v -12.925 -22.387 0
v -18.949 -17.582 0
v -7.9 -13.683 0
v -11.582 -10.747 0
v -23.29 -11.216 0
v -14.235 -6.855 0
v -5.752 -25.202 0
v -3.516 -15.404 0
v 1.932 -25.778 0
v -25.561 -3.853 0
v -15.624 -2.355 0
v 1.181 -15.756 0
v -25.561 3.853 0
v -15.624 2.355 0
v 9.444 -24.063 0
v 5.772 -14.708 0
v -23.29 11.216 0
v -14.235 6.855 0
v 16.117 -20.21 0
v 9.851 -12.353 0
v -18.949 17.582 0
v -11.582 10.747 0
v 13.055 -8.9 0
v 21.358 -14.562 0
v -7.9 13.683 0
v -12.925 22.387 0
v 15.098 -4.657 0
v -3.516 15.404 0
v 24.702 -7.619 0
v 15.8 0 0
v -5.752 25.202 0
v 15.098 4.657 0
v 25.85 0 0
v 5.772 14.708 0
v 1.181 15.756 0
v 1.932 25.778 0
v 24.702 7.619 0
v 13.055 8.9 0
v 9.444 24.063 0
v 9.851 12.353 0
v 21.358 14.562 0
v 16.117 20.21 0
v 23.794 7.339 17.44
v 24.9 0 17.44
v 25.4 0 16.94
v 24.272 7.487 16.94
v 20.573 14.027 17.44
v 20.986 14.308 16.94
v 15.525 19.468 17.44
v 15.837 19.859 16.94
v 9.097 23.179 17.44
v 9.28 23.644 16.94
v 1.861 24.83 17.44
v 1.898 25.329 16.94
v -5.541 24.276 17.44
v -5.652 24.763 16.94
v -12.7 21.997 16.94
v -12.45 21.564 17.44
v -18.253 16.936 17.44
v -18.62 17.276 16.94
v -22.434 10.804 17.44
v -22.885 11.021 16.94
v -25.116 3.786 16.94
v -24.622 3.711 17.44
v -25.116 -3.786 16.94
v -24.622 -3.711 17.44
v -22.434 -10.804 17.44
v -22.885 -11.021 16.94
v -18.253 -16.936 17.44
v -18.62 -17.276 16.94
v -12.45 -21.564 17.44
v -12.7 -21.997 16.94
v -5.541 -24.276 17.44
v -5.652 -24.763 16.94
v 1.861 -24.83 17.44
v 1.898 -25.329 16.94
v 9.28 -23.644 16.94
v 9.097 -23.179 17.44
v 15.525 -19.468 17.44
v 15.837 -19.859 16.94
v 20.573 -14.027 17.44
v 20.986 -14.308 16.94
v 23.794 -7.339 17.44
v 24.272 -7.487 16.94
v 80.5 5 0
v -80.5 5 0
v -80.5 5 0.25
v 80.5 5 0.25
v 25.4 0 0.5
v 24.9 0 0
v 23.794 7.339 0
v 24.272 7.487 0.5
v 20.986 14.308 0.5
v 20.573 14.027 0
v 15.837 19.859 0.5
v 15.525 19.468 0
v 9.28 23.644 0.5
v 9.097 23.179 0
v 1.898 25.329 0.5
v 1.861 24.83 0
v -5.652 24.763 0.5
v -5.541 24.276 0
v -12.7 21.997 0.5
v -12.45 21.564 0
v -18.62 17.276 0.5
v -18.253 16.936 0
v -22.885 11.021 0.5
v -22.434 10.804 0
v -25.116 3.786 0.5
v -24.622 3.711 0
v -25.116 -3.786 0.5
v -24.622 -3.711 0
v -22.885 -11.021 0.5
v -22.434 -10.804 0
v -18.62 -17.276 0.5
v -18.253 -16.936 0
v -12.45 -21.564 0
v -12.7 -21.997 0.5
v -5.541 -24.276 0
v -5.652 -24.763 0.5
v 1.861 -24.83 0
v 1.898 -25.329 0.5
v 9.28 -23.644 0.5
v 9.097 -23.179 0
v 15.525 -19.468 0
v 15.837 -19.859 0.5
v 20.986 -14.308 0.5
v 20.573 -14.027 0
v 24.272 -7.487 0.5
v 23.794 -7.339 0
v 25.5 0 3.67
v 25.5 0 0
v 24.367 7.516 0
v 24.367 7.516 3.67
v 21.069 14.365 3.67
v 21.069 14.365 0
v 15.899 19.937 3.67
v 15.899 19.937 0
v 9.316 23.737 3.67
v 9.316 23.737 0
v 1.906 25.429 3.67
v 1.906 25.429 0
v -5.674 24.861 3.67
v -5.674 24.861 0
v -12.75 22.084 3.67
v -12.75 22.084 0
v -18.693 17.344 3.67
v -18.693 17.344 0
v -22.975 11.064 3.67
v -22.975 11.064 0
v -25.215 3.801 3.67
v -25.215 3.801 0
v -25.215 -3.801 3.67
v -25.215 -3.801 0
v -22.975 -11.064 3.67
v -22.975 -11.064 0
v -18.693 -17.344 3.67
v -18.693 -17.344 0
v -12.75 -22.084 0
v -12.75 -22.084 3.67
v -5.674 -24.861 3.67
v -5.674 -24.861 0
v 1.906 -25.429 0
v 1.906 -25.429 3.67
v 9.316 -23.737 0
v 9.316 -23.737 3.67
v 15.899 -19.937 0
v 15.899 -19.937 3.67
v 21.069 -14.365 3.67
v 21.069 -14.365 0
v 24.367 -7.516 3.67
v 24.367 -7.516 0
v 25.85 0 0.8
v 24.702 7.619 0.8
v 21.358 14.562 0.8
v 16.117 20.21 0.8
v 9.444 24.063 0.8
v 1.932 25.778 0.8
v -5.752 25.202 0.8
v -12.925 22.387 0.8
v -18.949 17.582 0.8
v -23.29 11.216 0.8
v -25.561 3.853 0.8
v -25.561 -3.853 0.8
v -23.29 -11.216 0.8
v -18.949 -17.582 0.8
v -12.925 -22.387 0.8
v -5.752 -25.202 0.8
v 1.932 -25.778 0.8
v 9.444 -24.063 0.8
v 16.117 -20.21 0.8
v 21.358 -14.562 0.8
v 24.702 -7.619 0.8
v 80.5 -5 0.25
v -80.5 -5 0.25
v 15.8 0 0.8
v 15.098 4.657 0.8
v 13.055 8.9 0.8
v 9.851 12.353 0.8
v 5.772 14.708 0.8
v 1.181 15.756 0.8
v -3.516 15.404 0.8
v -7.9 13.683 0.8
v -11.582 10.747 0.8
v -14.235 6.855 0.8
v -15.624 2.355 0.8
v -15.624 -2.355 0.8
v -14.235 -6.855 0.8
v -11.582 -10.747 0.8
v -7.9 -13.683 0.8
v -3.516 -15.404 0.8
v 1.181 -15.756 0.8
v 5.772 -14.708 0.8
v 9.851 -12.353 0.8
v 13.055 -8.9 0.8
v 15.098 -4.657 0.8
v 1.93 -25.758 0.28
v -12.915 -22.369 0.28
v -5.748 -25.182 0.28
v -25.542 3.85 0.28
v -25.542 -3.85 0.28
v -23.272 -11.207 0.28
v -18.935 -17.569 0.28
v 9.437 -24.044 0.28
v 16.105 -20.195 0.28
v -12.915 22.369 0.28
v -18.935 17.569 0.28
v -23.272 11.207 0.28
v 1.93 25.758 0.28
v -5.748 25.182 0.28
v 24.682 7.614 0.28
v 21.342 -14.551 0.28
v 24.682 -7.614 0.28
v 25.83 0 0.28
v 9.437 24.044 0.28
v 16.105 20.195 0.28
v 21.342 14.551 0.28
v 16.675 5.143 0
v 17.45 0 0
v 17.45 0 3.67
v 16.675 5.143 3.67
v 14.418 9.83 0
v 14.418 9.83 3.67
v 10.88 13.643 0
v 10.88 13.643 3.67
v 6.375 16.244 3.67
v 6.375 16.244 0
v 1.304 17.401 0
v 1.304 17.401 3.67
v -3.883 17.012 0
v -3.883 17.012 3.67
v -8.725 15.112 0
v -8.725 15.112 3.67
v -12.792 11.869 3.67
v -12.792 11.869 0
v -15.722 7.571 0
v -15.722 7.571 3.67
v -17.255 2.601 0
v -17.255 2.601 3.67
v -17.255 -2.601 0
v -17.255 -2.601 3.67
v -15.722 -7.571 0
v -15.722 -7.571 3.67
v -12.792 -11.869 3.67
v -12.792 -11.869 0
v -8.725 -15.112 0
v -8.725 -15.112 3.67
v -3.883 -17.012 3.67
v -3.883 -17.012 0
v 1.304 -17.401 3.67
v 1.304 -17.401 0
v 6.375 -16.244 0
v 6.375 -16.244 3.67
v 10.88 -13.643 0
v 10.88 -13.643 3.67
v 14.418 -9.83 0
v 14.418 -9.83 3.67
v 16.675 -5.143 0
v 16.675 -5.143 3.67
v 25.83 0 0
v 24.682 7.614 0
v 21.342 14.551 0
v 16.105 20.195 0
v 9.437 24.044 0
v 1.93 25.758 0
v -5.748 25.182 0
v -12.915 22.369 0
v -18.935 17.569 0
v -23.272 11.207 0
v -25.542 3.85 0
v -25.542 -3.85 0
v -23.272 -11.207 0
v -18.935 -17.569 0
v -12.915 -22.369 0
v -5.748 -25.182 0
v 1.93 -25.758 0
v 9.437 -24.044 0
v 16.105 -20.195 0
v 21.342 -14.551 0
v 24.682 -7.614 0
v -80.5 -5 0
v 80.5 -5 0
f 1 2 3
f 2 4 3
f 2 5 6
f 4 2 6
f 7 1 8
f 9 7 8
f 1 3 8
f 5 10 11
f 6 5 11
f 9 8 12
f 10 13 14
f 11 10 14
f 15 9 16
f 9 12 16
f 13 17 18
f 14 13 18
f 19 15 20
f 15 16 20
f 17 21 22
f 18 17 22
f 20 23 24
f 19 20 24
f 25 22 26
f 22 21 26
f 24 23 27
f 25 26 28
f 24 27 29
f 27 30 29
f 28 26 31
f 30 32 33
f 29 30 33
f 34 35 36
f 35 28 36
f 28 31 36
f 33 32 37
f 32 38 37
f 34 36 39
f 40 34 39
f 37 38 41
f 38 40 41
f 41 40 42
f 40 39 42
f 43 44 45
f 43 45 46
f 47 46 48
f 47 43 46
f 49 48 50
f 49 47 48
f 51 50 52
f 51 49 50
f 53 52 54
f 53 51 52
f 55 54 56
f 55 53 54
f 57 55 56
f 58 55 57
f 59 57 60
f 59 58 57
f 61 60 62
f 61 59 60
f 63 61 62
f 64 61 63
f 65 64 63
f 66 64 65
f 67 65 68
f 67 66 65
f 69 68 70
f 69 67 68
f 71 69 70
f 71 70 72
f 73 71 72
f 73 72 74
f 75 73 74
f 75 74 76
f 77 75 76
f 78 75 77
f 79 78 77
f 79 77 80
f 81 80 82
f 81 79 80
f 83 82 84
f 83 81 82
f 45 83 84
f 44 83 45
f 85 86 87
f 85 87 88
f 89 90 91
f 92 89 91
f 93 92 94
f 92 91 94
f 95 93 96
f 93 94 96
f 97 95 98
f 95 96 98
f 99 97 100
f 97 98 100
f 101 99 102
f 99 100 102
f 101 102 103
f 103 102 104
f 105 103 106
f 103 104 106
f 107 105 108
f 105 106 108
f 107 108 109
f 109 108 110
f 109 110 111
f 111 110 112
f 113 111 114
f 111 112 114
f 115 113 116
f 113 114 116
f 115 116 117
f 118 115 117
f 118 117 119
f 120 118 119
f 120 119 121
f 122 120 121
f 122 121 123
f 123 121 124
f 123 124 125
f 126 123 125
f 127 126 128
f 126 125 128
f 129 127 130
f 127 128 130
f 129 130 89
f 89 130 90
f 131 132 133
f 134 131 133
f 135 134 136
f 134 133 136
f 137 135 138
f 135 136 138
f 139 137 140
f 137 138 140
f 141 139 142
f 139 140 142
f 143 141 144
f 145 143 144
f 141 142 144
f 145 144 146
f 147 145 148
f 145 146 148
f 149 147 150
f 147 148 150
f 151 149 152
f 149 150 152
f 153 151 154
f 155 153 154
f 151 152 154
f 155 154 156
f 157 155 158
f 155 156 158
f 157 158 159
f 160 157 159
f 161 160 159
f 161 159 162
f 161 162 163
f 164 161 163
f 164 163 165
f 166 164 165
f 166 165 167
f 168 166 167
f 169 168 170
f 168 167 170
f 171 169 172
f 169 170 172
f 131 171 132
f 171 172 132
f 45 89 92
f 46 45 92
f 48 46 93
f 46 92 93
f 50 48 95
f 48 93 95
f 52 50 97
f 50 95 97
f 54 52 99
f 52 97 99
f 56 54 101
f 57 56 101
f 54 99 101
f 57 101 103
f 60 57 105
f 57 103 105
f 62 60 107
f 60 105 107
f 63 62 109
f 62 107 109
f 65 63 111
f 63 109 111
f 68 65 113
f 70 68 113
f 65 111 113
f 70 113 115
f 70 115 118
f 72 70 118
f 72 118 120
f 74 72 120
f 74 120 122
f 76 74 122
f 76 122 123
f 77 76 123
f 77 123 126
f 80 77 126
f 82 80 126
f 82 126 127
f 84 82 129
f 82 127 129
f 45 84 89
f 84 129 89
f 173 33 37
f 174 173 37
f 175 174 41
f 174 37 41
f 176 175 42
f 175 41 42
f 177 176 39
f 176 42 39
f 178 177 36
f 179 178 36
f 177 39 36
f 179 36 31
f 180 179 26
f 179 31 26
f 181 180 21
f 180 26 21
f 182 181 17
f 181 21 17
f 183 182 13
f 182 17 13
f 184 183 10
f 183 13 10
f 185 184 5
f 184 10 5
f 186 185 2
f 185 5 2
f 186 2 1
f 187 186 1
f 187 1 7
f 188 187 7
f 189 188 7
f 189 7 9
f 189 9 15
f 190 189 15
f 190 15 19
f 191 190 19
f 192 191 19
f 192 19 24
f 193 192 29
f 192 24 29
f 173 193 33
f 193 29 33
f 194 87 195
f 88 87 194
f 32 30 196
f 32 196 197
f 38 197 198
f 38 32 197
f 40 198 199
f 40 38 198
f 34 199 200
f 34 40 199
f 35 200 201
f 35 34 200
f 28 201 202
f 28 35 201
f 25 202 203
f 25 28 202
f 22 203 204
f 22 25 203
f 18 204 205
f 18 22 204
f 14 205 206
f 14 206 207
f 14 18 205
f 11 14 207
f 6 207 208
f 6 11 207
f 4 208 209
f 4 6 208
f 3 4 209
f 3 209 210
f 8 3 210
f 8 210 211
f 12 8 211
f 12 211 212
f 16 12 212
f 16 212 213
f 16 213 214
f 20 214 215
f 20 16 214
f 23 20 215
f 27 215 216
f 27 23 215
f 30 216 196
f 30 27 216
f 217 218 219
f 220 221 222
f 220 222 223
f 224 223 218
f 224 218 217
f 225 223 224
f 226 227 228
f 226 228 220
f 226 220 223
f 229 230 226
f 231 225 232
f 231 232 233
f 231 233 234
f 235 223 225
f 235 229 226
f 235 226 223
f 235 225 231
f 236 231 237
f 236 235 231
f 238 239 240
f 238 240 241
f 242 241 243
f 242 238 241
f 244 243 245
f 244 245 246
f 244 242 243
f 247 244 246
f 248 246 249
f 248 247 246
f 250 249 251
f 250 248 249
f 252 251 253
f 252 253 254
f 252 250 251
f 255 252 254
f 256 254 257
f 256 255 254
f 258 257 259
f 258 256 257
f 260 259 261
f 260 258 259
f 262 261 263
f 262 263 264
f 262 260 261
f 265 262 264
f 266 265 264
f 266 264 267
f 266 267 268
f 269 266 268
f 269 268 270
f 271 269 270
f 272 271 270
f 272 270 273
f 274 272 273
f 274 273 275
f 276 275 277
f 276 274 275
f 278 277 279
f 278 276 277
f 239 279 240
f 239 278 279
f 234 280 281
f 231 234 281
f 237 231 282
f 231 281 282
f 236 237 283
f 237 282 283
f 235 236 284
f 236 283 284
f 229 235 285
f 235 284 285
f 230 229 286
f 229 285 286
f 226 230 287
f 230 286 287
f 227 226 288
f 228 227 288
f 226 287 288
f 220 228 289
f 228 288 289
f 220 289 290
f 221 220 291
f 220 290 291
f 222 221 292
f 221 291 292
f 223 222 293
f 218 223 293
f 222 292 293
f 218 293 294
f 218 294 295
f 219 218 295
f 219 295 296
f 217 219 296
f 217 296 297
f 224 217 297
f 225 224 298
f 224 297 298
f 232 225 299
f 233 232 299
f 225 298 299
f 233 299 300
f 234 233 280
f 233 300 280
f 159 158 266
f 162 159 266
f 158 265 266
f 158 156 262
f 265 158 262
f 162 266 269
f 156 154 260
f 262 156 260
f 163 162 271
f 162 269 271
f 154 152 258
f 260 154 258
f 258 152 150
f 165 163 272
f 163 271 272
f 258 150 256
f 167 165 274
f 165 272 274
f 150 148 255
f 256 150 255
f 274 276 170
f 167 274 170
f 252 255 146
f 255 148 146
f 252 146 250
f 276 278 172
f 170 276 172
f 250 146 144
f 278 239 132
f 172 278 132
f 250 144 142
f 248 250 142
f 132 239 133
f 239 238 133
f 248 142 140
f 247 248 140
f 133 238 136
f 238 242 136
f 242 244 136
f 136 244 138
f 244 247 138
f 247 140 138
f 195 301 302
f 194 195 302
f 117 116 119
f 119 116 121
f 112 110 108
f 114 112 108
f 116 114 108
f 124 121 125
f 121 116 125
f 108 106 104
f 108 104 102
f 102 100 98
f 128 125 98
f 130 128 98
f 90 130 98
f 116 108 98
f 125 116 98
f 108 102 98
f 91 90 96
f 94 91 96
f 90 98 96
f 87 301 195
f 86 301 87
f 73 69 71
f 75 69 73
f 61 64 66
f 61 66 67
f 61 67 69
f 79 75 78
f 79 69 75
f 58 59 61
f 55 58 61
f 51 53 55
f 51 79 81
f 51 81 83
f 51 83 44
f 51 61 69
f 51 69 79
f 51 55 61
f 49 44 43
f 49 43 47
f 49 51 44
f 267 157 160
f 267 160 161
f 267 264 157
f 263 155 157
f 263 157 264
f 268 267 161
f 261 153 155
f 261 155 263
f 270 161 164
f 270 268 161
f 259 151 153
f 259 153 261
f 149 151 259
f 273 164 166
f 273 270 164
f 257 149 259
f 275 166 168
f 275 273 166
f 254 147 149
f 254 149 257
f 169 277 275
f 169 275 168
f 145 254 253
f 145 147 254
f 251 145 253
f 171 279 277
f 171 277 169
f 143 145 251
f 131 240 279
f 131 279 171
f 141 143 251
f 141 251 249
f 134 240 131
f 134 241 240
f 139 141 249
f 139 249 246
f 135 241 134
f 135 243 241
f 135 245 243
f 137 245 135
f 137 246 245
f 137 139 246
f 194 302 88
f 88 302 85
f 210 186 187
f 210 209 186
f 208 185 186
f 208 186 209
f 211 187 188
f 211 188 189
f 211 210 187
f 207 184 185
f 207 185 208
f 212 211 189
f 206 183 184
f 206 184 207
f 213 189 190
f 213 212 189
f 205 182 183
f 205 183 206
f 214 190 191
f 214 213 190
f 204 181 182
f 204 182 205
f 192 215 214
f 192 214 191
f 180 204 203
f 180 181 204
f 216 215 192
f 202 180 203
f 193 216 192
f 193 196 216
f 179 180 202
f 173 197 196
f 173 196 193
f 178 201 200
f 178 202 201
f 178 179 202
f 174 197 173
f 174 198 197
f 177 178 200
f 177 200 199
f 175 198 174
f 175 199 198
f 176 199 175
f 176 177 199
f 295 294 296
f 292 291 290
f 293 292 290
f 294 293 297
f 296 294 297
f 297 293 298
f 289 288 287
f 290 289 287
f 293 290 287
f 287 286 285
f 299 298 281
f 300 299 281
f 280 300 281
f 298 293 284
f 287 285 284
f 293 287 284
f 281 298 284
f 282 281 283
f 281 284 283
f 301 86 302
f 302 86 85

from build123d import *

# Parameters (mm, degrees)
F0_R      = 25.4
F1_DEPTH  = 17.44
F2_R      = 25.85
F2_R_2    = 15.8
F3_DEPTH  = 0.8
F4_R      = 25.5
F4_R_2    = 17.45
F5_DEPTH  = 3.67
F6_R      = 25.83
F7_DEPTH  = 0.28
F8_SIZE   = 0.5
F9_W      = 161
F9_H      = 10
F10_DEPTH = 0.25


with BuildPart() as f1:
    # F0 (on Top) → F1 (new body)
    with BuildSketch(Plane.XY):
        Circle(F0_R)
    extrude(amount=F1_DEPTH)

    # F8
    f8_edges = [f1.edges().sort_by_distance(p)[0] for p in [
        (-25.4, 0, 17.44),
        (-25.4, 0, 0),
    ]]
    chamfer(f8_edges, length=F8_SIZE)


with BuildPart() as f3:
    # F2 (on Top) → F3 (new body)
    with BuildSketch(Plane.XY):
        Circle(F2_R)
        Circle(F2_R_2, mode=Mode.SUBTRACT)
    extrude(amount=F3_DEPTH)


with BuildPart() as f5:
    # F4 (on Top) → F5 (new body)
    with BuildSketch(Plane.XY):
        Circle(F4_R)
        Circle(F4_R_2, mode=Mode.SUBTRACT)
    extrude(amount=F5_DEPTH)


with BuildPart() as f7:
    # F6 (on Top) → F7 (new body)
    with BuildSketch(Plane.XY):
        Circle(F6_R)
    extrude(amount=F7_DEPTH)


with BuildPart() as f10:
    # F9 (on Top) → F10 (new body)
    with BuildSketch(Plane.XY):
        Rectangle(F9_W, F9_H)
    extrude(amount=F10_DEPTH)


solid = Compound([f1.part, f3.part, f5.part, f7.part, f10.part])
